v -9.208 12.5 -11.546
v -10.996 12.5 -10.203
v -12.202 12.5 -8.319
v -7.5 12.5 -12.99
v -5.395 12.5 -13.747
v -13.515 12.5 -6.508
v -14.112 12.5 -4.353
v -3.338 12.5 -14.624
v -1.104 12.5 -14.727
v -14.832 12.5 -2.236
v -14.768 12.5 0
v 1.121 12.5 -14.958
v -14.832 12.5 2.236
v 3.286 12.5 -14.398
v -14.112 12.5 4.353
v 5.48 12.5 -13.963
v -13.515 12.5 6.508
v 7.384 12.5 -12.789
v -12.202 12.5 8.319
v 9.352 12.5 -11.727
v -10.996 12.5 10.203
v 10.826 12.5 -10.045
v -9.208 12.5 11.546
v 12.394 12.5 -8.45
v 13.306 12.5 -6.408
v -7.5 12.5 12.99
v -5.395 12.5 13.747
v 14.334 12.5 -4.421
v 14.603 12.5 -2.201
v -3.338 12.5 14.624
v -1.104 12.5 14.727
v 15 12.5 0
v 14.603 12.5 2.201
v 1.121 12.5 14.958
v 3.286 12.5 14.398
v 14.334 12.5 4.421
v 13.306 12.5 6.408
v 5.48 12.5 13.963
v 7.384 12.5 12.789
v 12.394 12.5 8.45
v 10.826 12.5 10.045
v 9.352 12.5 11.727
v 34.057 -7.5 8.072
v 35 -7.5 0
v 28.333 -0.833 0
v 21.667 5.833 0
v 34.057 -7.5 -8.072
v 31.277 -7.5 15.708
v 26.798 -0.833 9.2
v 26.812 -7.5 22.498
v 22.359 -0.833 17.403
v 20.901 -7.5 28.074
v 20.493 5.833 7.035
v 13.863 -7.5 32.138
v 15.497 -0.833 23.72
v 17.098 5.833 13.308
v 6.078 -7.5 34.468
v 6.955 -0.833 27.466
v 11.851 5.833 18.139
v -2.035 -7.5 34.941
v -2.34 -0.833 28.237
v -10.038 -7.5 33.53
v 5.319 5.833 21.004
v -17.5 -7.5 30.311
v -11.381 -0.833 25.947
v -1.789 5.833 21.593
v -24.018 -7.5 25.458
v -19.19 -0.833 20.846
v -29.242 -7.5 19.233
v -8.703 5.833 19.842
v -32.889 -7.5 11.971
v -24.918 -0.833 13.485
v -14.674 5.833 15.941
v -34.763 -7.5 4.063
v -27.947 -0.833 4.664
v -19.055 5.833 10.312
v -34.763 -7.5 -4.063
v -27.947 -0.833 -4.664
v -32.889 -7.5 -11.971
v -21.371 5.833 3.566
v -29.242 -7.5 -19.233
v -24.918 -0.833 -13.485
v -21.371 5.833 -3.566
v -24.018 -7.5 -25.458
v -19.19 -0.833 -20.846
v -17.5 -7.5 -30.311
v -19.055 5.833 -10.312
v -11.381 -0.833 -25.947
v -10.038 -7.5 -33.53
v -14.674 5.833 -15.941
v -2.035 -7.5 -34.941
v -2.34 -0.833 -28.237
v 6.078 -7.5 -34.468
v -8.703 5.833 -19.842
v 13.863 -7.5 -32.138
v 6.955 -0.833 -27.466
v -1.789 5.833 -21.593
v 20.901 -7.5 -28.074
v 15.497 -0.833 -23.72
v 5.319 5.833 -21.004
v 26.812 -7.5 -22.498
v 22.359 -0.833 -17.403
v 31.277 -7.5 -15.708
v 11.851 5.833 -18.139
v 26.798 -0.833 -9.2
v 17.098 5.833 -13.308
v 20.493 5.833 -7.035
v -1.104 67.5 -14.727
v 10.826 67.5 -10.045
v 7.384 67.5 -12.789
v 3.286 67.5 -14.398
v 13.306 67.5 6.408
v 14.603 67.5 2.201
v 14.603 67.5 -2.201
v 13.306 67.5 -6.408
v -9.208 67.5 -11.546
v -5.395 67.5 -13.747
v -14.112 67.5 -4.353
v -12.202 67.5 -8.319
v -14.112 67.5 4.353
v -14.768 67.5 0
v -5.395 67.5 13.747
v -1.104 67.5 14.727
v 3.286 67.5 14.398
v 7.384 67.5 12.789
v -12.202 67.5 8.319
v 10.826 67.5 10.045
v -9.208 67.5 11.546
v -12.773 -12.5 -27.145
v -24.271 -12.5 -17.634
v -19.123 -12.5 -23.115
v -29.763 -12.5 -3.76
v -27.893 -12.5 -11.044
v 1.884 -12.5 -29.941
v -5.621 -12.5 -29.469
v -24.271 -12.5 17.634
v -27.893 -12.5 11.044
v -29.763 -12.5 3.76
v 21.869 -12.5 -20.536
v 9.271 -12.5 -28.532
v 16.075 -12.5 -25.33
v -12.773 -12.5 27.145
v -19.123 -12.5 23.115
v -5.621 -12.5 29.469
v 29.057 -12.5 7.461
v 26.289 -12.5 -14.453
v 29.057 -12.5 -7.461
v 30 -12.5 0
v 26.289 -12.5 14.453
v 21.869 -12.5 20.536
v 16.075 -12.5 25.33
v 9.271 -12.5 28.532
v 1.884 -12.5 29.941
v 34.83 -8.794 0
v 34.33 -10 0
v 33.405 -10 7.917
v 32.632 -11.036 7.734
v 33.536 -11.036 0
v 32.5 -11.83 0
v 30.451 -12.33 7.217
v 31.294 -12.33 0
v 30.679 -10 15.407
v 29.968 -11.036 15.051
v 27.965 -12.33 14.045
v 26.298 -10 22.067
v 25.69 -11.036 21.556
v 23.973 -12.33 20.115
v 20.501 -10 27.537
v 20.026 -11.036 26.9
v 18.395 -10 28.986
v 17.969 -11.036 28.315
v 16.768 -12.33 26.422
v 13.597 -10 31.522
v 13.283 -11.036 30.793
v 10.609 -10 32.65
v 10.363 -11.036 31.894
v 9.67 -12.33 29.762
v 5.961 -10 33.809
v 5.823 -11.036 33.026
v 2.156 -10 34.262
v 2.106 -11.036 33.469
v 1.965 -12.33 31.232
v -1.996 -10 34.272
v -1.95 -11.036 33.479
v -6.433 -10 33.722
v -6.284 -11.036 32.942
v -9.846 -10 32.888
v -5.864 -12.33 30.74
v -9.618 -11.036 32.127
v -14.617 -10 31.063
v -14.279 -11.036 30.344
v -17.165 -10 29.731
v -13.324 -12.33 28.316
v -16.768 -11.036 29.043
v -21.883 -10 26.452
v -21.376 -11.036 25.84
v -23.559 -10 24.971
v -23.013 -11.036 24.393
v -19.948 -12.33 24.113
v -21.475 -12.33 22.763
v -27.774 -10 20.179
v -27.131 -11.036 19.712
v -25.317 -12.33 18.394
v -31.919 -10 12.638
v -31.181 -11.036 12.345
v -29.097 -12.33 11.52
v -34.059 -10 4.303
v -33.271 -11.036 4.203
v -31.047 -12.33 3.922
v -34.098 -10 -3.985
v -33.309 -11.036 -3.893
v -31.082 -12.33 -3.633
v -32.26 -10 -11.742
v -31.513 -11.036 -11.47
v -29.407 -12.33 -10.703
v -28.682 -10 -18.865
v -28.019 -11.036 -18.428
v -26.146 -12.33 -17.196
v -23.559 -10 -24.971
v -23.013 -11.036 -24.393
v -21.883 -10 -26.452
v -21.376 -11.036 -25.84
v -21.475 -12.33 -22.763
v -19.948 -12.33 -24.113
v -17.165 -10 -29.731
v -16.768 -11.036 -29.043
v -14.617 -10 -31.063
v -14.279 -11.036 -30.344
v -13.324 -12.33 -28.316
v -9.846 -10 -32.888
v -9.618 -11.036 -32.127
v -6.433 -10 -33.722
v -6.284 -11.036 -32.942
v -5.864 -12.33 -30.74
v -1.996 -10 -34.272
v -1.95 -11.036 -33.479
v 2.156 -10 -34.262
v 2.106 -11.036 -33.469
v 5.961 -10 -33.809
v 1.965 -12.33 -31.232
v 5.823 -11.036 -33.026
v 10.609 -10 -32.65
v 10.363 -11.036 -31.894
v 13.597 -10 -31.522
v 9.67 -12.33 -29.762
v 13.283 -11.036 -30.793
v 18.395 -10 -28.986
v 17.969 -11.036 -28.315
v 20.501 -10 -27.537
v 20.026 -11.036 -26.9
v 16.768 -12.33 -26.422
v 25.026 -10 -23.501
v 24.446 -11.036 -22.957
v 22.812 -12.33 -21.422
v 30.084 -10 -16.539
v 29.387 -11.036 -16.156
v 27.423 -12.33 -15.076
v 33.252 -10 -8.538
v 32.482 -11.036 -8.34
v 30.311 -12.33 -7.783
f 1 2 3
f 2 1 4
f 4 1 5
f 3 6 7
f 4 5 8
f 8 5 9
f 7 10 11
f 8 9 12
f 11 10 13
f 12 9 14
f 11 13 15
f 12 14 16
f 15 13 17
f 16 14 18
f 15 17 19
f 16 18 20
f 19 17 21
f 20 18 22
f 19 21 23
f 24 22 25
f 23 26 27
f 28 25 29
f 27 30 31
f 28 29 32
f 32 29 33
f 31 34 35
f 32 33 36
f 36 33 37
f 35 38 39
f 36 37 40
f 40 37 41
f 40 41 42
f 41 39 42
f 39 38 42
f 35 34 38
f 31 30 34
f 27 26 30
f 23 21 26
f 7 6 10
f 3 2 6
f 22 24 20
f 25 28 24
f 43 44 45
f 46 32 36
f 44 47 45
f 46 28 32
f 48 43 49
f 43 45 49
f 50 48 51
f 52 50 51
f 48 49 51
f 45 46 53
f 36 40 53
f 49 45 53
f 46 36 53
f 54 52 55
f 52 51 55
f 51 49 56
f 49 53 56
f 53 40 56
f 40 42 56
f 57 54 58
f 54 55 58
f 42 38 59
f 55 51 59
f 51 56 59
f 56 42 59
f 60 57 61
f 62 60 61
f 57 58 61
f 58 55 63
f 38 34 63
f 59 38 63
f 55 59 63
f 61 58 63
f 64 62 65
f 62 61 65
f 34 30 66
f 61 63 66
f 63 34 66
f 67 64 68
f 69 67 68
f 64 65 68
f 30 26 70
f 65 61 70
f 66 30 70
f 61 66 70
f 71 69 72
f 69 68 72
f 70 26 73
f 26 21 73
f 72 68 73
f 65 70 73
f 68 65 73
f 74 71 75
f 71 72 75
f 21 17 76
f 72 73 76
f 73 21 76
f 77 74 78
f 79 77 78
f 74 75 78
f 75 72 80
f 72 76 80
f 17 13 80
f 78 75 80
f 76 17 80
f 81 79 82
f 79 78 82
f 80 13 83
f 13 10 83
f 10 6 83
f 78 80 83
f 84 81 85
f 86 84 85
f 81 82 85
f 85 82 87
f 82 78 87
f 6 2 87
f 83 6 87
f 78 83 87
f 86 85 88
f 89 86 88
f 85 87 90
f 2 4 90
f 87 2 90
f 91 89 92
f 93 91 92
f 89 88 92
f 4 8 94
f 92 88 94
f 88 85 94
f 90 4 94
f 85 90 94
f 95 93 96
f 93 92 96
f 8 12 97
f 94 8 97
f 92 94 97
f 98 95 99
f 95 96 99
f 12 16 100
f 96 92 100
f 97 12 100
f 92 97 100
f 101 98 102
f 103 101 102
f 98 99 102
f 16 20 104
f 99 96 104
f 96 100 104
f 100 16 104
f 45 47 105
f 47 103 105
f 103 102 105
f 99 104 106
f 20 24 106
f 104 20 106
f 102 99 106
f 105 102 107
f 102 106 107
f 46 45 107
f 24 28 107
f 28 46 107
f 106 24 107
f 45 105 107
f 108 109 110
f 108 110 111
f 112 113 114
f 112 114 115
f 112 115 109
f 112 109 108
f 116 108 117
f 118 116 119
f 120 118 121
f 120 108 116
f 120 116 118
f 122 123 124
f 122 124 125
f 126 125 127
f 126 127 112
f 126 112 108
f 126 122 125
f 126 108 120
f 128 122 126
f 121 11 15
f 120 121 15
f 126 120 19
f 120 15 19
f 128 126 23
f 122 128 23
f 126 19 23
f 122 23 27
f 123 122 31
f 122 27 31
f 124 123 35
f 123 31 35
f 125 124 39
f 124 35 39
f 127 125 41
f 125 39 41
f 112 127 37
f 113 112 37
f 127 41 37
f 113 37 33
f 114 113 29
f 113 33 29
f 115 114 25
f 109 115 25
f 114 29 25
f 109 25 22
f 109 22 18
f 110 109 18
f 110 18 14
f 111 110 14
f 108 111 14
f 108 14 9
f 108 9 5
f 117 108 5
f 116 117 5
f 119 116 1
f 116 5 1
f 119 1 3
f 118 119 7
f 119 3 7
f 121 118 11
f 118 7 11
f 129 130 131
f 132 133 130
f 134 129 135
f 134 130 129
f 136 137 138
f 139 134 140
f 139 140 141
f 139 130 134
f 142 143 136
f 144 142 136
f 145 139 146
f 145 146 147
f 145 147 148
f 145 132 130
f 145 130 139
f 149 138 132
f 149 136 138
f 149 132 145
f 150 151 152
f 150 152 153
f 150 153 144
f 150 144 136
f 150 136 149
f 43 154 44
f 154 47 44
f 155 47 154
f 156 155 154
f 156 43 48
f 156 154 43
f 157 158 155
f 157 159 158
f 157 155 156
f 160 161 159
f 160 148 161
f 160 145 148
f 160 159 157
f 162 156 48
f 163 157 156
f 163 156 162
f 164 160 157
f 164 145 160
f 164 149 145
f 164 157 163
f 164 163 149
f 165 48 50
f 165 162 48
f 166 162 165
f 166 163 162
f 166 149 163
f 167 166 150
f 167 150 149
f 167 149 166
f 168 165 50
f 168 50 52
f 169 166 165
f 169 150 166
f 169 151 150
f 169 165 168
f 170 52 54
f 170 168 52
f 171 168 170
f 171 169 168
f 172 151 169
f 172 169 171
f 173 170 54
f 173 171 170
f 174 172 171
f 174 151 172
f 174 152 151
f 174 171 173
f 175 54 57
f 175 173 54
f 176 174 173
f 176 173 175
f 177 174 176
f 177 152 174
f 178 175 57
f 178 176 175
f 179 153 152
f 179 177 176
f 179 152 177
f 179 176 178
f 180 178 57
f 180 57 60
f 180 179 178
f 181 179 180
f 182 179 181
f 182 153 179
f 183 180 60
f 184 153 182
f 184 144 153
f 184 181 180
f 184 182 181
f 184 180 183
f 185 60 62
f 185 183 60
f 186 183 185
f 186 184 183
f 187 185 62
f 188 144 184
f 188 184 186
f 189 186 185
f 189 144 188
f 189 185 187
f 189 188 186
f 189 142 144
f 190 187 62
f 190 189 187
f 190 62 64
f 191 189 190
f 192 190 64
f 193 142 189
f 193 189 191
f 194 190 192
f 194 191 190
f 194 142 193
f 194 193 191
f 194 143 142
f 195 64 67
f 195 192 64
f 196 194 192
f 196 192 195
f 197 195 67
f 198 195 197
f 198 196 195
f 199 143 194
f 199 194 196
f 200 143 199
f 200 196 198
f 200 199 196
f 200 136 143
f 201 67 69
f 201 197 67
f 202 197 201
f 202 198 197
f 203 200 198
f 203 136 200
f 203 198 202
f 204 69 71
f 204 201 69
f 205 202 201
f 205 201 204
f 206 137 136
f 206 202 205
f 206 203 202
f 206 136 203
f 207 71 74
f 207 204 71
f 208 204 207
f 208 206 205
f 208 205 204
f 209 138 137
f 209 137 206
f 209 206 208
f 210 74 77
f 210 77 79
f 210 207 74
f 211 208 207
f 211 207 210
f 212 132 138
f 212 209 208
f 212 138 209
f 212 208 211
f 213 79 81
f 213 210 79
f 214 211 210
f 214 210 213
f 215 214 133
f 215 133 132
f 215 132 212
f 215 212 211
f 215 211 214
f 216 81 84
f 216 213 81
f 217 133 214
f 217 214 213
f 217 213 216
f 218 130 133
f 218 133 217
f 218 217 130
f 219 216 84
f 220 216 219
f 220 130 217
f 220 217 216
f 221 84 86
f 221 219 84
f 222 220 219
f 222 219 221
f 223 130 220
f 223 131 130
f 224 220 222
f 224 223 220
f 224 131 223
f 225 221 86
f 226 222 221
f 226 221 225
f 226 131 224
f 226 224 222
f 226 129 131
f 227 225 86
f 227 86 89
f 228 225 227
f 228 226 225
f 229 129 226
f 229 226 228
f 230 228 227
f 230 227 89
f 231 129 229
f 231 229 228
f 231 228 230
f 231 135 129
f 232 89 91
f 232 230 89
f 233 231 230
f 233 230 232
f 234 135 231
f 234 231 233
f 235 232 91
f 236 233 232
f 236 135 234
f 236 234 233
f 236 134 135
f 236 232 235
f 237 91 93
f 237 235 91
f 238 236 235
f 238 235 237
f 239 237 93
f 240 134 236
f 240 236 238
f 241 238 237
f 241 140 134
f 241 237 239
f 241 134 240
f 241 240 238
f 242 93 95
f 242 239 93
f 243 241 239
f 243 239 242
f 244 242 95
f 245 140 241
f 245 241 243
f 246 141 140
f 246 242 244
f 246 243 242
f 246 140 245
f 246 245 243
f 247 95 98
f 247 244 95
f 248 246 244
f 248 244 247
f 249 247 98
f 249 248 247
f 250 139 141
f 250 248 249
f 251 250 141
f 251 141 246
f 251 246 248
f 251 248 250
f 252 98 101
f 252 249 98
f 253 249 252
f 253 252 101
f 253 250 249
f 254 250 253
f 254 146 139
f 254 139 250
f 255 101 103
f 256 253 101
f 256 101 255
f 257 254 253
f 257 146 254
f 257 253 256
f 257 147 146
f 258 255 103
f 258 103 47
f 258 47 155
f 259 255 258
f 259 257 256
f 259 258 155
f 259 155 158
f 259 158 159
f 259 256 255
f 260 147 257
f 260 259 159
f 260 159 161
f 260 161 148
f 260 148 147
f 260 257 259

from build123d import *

# Parameters (mm, degrees)
F0_R     = 35
F1_DEPTH = 12.5
F2_R     = 5
F3_SIZE  = 19.99999
F4_R     = 14.7680159512
F5_DEPTH = 55


# Not quite as in the source:
# - a fillet or chamfer is up to 0.001 mm smaller than in the source, because OpenCascade refuses the exact size


with BuildPart() as f1:
    # F0 (on Front) → F1 (new body, symmetric)
    with BuildSketch(Plane.XZ):
        Circle(F0_R)
    extrude(amount=F1_DEPTH, both=True)

    # F2
    f2_edges = [f1.edges().sort_by_distance(p)[0] for p in [
        (-35, -12.5, 0),
    ]]
    fillet(f2_edges, radius=F2_R)

    # F3 (size 20 in the source; OpenCascade refuses exactly that, so slightly less here)
    f3_edges = [f1.edges().sort_by_distance(p)[0] for p in [
        (-35, 12.5, 0),
    ]]
    chamfer(f3_edges, length=F3_SIZE)

    # F4 (on face) → F5 (join)
    with BuildSketch(Plane(origin=(0, 12.5, 0), x_dir=(-1, 0, 0), z_dir=(0, 1, 0))):
        Circle(F4_R)
    extrude(amount=F5_DEPTH)


solid = f1.part
